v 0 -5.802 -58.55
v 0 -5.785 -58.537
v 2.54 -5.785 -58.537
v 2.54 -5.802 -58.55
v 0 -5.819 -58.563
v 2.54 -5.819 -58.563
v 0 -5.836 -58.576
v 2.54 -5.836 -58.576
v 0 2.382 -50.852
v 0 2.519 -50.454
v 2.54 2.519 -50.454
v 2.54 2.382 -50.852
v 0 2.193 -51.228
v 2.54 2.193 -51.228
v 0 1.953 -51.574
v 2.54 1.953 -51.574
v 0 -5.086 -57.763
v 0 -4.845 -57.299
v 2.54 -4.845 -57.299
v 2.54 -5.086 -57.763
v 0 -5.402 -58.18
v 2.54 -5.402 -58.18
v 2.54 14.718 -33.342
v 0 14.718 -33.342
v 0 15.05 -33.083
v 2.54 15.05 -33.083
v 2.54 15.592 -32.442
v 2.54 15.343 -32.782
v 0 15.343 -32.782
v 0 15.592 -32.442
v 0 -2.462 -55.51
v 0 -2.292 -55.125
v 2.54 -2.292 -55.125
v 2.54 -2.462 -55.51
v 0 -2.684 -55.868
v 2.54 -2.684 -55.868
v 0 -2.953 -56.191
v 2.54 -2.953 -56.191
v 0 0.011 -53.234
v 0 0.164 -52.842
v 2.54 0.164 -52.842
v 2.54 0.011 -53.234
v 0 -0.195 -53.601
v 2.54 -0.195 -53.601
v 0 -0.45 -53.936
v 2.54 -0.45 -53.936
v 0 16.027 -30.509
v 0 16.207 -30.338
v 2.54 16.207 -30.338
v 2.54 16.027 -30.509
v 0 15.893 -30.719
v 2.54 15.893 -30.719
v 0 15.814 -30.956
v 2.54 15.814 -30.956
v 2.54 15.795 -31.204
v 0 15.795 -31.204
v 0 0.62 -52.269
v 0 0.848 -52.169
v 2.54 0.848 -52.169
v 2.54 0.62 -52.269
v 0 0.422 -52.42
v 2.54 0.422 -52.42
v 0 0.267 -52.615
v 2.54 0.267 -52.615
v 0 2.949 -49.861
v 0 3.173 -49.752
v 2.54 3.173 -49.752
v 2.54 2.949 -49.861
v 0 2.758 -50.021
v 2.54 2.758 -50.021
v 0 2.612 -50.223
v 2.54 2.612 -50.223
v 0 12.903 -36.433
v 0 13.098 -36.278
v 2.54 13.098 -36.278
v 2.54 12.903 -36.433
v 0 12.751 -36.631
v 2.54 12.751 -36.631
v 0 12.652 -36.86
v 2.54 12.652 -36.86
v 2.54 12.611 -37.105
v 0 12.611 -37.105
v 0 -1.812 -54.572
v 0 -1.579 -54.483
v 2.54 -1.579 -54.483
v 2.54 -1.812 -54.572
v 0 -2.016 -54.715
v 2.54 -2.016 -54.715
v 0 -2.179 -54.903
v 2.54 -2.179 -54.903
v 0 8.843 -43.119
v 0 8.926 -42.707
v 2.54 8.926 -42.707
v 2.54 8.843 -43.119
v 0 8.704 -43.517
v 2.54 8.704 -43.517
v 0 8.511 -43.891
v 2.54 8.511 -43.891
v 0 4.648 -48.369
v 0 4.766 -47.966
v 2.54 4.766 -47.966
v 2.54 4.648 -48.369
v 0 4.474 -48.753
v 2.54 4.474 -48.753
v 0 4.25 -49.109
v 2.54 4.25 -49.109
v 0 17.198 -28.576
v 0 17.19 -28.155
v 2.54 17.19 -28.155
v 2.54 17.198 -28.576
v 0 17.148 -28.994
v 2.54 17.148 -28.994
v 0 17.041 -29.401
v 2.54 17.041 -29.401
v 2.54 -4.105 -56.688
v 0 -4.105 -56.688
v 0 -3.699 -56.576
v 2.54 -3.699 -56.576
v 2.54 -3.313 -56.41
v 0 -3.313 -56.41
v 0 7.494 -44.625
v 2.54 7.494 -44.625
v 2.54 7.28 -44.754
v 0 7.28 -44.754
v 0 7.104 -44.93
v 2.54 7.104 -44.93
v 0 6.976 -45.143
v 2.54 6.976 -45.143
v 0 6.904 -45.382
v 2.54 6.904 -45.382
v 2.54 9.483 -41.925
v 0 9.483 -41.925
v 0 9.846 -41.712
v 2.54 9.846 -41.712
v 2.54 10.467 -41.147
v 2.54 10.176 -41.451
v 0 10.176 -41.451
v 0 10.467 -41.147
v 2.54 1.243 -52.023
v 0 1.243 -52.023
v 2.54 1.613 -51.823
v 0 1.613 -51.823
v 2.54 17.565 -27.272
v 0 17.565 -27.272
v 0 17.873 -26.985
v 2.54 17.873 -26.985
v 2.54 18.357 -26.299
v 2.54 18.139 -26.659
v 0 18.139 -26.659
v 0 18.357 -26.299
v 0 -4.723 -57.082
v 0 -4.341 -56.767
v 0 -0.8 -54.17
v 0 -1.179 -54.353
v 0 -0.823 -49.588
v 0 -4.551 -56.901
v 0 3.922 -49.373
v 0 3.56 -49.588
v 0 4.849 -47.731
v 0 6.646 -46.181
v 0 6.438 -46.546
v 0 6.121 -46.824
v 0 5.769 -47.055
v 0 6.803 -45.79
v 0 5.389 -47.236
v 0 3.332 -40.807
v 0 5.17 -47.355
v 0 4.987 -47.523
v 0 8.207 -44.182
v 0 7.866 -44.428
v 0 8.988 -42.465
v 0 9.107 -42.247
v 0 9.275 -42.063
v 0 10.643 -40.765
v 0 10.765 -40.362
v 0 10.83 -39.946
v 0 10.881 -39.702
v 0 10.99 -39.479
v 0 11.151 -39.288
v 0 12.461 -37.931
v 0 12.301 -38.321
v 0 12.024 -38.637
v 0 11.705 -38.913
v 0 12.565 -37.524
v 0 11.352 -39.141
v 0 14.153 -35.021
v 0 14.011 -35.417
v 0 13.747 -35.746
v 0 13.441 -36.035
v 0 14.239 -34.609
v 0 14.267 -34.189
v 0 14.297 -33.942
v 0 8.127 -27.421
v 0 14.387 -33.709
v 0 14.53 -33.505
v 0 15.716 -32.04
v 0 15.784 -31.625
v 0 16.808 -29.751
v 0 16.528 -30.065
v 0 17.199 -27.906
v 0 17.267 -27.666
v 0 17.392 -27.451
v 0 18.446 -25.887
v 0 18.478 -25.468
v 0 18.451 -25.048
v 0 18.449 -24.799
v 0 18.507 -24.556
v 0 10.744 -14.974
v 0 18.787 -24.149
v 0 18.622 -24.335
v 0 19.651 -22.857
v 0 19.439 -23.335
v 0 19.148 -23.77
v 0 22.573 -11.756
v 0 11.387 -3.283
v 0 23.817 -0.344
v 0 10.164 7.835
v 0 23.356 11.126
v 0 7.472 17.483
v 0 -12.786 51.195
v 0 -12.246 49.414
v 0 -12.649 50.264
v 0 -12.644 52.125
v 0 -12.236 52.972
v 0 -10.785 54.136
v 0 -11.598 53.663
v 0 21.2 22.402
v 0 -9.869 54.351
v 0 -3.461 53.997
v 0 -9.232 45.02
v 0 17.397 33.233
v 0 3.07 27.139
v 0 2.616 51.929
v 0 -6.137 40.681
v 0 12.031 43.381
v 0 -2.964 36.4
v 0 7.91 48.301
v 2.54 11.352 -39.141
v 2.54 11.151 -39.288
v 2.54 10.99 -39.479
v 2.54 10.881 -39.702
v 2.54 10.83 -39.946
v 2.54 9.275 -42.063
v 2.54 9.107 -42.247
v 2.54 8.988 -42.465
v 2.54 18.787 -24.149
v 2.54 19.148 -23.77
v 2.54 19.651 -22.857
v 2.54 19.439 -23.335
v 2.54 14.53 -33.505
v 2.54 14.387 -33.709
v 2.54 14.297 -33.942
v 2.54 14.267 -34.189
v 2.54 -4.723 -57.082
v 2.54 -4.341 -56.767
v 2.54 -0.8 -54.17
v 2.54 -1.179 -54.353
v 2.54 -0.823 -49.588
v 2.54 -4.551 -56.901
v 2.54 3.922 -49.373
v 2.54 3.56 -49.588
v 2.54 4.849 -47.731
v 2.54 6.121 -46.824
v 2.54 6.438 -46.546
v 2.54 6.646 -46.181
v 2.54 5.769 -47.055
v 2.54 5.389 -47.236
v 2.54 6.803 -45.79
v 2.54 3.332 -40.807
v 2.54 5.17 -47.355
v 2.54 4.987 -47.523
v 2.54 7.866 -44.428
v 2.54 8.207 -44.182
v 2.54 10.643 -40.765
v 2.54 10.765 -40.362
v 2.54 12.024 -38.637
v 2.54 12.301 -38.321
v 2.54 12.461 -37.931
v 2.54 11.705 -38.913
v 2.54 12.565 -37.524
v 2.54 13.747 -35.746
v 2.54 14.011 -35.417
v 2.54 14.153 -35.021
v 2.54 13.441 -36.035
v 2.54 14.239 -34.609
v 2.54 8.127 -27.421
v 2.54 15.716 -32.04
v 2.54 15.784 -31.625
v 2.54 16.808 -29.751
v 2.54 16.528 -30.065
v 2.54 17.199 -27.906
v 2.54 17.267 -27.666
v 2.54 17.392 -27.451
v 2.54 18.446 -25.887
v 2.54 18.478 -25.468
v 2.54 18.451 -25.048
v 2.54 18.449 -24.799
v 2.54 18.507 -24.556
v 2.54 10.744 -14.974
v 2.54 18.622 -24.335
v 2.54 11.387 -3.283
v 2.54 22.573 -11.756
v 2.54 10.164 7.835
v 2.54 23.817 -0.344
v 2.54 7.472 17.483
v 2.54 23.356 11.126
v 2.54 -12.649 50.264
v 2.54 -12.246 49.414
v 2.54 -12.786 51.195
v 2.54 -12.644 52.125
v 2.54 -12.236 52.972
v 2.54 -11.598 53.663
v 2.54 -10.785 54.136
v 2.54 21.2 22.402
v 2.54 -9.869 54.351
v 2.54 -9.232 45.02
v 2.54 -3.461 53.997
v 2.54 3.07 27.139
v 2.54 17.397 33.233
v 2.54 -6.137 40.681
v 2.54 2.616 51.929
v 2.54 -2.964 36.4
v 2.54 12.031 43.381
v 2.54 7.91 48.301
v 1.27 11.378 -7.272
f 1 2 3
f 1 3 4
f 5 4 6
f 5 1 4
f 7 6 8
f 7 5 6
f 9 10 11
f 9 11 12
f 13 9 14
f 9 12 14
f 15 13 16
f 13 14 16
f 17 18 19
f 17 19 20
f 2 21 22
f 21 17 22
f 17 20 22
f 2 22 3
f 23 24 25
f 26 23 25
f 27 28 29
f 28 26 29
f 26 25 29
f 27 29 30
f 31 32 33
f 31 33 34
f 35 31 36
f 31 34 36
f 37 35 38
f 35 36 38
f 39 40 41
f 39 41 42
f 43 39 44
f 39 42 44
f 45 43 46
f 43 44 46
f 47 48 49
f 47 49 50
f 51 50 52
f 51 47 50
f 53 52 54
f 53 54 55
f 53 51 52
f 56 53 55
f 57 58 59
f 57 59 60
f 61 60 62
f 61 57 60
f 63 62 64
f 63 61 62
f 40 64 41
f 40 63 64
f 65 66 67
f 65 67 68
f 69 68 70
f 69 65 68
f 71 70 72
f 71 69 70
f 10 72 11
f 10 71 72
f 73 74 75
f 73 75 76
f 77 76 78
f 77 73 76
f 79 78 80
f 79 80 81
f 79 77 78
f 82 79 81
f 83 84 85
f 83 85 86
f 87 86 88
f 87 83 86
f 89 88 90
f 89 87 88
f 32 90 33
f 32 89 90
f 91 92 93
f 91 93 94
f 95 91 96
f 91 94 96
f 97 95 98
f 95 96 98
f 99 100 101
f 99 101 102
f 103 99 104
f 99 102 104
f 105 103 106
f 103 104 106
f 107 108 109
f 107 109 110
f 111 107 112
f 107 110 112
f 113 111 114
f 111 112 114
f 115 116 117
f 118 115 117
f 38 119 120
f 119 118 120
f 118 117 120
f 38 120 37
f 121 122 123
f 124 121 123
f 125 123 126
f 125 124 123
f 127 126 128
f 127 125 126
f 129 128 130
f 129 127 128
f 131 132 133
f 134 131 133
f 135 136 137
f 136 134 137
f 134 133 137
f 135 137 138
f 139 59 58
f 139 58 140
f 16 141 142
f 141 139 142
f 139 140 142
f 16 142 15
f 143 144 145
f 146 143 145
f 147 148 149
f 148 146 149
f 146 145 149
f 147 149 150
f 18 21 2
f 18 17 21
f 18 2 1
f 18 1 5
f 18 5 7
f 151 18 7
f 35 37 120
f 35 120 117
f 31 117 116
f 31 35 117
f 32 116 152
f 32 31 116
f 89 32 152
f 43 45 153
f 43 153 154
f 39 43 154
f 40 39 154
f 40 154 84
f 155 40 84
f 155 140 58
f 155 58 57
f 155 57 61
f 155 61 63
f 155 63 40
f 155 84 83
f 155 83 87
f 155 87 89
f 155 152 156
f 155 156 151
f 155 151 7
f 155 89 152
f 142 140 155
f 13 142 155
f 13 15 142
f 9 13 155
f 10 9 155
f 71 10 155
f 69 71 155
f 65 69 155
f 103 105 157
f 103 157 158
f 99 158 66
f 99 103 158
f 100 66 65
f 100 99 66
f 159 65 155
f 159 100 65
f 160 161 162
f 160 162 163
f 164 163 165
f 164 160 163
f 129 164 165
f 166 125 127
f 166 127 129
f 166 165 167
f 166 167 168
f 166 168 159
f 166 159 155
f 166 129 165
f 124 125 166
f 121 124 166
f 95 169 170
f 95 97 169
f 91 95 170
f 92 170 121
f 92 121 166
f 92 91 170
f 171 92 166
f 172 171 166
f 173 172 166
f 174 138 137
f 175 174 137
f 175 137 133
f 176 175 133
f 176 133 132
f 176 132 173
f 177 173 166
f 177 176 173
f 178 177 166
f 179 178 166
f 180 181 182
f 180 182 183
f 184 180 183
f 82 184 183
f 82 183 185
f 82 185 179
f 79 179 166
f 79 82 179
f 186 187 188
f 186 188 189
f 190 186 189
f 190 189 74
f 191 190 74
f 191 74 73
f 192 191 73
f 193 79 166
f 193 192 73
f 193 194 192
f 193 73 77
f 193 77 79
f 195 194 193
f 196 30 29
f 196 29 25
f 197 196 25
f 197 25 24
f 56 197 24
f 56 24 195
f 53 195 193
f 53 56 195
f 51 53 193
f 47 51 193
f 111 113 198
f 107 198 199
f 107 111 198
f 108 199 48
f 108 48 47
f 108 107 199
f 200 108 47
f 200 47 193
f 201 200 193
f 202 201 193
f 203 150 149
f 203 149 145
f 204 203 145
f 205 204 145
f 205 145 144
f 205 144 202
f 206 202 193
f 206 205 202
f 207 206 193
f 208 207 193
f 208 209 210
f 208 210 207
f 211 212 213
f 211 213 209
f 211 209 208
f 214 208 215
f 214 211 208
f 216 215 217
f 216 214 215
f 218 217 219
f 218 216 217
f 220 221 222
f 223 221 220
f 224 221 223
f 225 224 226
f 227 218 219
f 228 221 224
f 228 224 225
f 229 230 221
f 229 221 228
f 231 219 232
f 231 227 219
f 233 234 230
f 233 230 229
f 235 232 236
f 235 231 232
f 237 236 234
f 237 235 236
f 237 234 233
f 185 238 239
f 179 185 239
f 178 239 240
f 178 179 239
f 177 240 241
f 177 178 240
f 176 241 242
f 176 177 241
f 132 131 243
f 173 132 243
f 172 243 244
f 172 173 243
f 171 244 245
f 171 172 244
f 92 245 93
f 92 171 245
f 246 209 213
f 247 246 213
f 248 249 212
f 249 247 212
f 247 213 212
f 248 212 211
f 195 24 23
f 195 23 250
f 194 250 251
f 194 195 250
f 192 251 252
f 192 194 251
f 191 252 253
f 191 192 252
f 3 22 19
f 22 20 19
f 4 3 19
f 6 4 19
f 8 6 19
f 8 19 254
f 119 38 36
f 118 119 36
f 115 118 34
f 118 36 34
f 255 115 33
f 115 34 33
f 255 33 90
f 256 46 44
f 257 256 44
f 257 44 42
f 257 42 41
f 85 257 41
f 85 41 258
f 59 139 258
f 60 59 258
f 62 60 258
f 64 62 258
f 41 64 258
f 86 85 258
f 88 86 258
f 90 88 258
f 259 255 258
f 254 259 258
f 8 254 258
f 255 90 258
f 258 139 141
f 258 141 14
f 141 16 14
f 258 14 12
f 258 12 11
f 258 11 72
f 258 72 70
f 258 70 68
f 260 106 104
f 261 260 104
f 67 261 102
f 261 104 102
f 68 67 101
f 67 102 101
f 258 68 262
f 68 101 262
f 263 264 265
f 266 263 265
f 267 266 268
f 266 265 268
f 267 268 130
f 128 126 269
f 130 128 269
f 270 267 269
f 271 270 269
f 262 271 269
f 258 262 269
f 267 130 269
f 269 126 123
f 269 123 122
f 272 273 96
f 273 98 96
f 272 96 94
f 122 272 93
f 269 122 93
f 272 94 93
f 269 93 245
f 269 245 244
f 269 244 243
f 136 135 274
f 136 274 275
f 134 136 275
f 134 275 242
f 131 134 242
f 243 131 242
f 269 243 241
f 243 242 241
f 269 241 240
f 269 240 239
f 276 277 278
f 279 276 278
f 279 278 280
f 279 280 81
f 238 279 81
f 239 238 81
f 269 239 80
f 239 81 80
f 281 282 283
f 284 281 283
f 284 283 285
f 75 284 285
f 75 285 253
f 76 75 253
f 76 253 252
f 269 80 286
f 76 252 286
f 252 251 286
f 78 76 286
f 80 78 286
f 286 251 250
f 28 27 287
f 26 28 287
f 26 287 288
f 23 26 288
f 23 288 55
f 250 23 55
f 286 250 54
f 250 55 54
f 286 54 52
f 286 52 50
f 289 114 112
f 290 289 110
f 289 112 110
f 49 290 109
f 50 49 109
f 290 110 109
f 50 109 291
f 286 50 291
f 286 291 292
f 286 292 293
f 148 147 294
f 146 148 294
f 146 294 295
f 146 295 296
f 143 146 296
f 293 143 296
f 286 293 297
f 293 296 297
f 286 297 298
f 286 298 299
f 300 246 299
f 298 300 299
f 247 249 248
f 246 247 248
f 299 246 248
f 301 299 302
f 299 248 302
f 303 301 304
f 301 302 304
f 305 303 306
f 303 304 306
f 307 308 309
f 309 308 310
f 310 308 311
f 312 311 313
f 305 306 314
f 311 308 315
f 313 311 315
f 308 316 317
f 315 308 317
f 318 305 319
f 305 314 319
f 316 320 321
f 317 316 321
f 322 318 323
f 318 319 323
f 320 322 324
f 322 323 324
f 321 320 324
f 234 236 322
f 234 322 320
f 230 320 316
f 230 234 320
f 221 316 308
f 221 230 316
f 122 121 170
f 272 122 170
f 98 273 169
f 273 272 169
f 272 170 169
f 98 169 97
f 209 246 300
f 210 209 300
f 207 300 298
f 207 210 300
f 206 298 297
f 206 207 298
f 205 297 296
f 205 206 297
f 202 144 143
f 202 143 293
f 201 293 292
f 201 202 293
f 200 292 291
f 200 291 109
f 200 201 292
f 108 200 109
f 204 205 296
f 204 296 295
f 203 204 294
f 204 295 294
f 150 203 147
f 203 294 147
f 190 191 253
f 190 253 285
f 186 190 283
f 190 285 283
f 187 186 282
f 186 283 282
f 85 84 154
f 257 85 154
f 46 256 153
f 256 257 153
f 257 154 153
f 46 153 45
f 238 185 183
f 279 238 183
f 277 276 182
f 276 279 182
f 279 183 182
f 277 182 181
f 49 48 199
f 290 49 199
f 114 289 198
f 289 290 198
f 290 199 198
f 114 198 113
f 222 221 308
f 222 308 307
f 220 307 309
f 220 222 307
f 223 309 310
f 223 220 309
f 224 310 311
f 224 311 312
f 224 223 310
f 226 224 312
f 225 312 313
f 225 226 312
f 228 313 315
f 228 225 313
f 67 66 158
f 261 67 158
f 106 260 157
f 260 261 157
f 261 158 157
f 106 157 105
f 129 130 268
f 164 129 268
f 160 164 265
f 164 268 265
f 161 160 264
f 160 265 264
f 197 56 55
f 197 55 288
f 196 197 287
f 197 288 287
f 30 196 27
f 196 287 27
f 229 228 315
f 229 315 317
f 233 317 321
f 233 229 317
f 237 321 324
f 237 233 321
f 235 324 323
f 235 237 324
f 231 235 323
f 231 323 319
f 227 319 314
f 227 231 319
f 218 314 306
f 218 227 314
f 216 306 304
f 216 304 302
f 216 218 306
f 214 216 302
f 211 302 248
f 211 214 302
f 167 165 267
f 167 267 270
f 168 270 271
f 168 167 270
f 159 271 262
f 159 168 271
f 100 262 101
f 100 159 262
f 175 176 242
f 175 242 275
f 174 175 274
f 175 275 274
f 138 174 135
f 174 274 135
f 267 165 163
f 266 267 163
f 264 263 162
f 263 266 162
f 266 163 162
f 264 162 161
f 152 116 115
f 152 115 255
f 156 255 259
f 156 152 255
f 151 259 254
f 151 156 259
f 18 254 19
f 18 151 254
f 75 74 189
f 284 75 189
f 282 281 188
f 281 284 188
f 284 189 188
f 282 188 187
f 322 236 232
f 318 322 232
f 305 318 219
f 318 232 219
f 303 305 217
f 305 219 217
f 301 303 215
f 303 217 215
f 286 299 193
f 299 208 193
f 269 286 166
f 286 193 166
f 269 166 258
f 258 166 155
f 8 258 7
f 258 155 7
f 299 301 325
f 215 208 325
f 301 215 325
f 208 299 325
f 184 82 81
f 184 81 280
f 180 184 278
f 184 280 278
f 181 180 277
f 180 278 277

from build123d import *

# Parameters (mm, degrees)
BOSS_EXTRUDE1_DEPTH = 2.54
CUT_EXTRUDE1_START  = -2.54
CUT_EXTRUDE1_DEPTH  = 2.54
CIRPATTERN1_COUNT   = 27
CIRPATTERN1_ANGLE   = 65
FILLET1_R           = 3.048


with BuildPart() as part:
    # Sketch1 → Boss-Extrude1 (new body)
    with BuildSketch(Plane(origin=(0, 0, 0), x_dir=(0, 0, -1), z_dir=(1, 0, 0))):
        with BuildLine():
            ThreePointArc((-43.381076299, 12.030901448), (11.033243319, 22.702964816), (58.576421759, -5.83573347))
            add(Edge.make_bspline(
                [(-36.400312003, -2.96377669), (3.456833979, 27.156600716), (58.576421759, -5.83573347)],
                knots=[0, 0, 0, 1, 1, 1], degree=2))
            ThreePointArc((-36.400312003, -2.96377669), (-42.843357456, -7.694652529), (-49.414438561, -12.246016505))
            ThreePointArc((-49.414438561, -12.246016505), (-52.563618606, -12.471871328), (-54.350611077, -9.868987685))
            ThreePointArc((-54.350611077, -9.868987685), (-51.929499525, 2.615525346), (-43.381076299, 12.030901448))
        make_face()
    extrude(amount=BOSS_EXTRUDE1_DEPTH)

    # Sketch2 → Cut-Extrude1 (cut)
    with BuildSketch(Plane(origin=(2.54, 0, 0), x_dir=(0, 0, -1), z_dir=(1, 0, 0)).offset(CUT_EXTRUDE1_START)):
        with BuildLine():
            ThreePointArc((25.551250128, 18.666636018), (25.832723904, 19.021035399), (25.93313959, 19.462332462))
            ThreePointArc((25.93313959, 19.462332462), (24.821637158, 20.47810228), (23.909811979, 19.279853215))
            ThreePointArc((23.909811989, 19.279853244), (24.732270015, 18.977899406), (25.55125014, 18.666636047))
        make_face()
        with BuildLine():
            ThreePointArc((25.55125014, 18.666636047), (24.732270015, 18.977899406), (23.909811989, 19.279853244))
            ThreePointArc((23.909811979, 19.279853215), (24.556324155, 18.506933739), (25.551250128, 18.666636018))
        make_face()
    cut_extrude1 = extrude(amount=CUT_EXTRUDE1_DEPTH, mode=Mode.SUBTRACT)

    # CirPattern1: Cut-Extrude1 ×27 about axis
    cirpattern1_axis = Axis((0, -53.378286458, 2.29893888), (-1, 0, 0))
    for i in range(1, CIRPATTERN1_COUNT):
        add(cut_extrude1.rotate(cirpattern1_axis, i * CIRPATTERN1_ANGLE / (CIRPATTERN1_COUNT - 1)), mode=Mode.SUBTRACT)

    # Fillet1
    # the kernel refuses this fillet: 3.048 mm, written as the material it takes off along each edge
    with BuildSketch(Plane(origin=(5.330131359, -4.91064789, -57.842493504), x_dir=(0, -0.7831380255895678, -0.6218479178027966), z_dir=(-1, 0, 0)), Plane(origin=(5.330131359, 18.666635995, -25.5512501), x_dir=(0, -0.3672934659287651, -0.9301051069024593), z_dir=(-1, 0, 0)), Plane(origin=(5.330131359, 17.383257012, -28.667298272), x_dir=(0, -0.40751449888321617, -0.913198736968006), z_dir=(-1, 0, 0)), Plane(origin=(5.330131359, 15.965179408, -31.724400451), x_dir=(0, -0.4469598048274426, -0.8945540413349069), z_dir=(-1, 0, 0)), Plane(origin=(5.330131359, 14.415102576, -34.71673727), x_dir=(0, -0.48555429737964134, -0.8742065112410012), z_dir=(-1, 0, 0)), Plane(origin=(5.330131359, 12.735977175, -37.638612645), x_dir=(0, -0.5232245097296833, -0.8521948793662941), z_dir=(-1, 0, 0)), Plane(origin=(5.330131359, 10.930999516, -40.484464621), x_dir=(0, -0.5598987344873042, -0.8285610461031312), z_dir=(-1, 0, 0)), Plane(origin=(5.330131359, 9.003605475, -43.248875957), x_dir=(0, -0.5955071601812754, -0.8033499997963732), z_dir=(-1, 0, 0)), Plane(origin=(5.330131359, 6.957463958, -45.926584439), x_dir=(0, -0.6299820041494215, -0.776609731105578), z_dir=(-1, 0, 0)), Plane(origin=(5.330131359, 4.79646991, -48.512492896), x_dir=(0, -0.663257641566846, -0.7483911416520008), z_dir=(-1, 0, 0)), Plane(origin=(5.330131359, 2.524736907, -51.001678904), x_dir=(0, -0.6952707303664444, -0.7187479471245193), z_dir=(-1, 0, 0)), Plane(origin=(5.330131359, 0.146589322, -53.389404158), x_dir=(0, -0.7259603318141797, -0.6877365750287285), z_dir=(-1, 0, 0)), Plane(origin=(5.330131359, -2.333445906, -55.671123485), x_dir=(0, -0.7552680265094119, -0.6554160572739871), z_dir=(-1, 0, 0))) as fillet1_piece_1:
        with BuildLine():
            CenterArc((1.094032194, 3.047920456), FILLET1_R, 240.878460026, 29.535478311)
            ThreePointArc((-0.389319175, 0.385220188), (-0.168317676, 0.2192323), (0, 0))
            ThreePointArc((0, 0), (0.558026272, -0.002015763), (1.116052544, 0))
        make_face()
    extrude(amount=8.120262718, mode=Mode.SUBTRACT)
    with BuildSketch(Plane(origin=(-2.790131315, 19.27985318, -23.909811985), x_dir=(0, -0.8996941201267986, -0.43652089321046916), z_dir=(1, 0, 0)), Plane(origin=(-2.790131315, 18.067489074, -27.0541706), x_dir=(0, -0.917878584614337, -0.39686131570912947), z_dir=(1, 0, 0)), Plane(origin=(-2.790131315, 16.719123874, -30.142653902), x_dir=(0, -0.9343158150472597, -0.35644629013720247), z_dir=(1, 0, 0)), Plane(origin=(-2.790131315, 15.23732427, -33.169382789), x_dir=(0, -0.9489745222231959, -0.3153527487929306), z_dir=(1, 0, 0)), Plane(origin=(-2.790131315, 13.62491095, -36.12859571), x_dir=(0, -0.9618268024599005, -0.27365891556783495), z_dir=(1, 0, 0)), Plane(origin=(-2.790131315, 11.884953236, -39.014659634), x_dir=(0, -0.9728481907114557, -0.23144415704322063), z_dir=(1, 0, 0)), Plane(origin=(-2.790131315, 10.020763236, -41.822080775), x_dir=(0, -0.982017707138919, -0.18878883141123673), z_dir=(1, 0, 0)), Plane(origin=(-2.790131315, 8.035889542, -44.545515048), x_dir=(0, -0.9893178970466047, -0.1457741355086141), z_dir=(1, 0, 0)), Plane(origin=(-2.790131315, 5.934110473, -47.179778241), x_dir=(0, -0.9947348641081103, -0.10248195025378501), z_dir=(1, 0, 0)), Plane(origin=(-2.790131315, 3.719426885, -49.719855883), x_dir=(0, -0.9982582968187538, -0.05899468478194456), z_dir=(1, 0, 0)), Plane(origin=(-2.790131315, -1.031583847, -54.498302279), x_dir=(0, -0.9996013481872734, 0.028233751117859005), z_dir=(1, 0, 0)), Plane(origin=(-2.790131315, -3.558867172, -56.72757499), x_dir=(0, -0.9974184102705359, 0.07180887726038374), z_dir=(1, 0, 0))) as fillet1_piece_2:
        with BuildLine():
            CenterArc((1.366088814, -2.936073381), FILLET1_R, 105.575244384, 29.535478311)
            ThreePointArc((-0.793333618, -0.784980924), (-0.398084606, -0.391057579), (0, 0))
            ThreePointArc((0, 0), (0.273844853, -0.037451811), (0.547689705, 0))
        make_face()
    extrude(amount=8.120262631, mode=Mode.SUBTRACT)
    with BuildSketch(Plane(origin=(-2.790131315, 1.396054555, -52.160912793), x_dir=(0, 0.6999264755180646, 0.7142149038411757), z_dir=(1, 0, 0))) as fillet1_piece_3:
        with BuildLine():
            CenterArc((1.094032194, 3.047920456), FILLET1_R, 240.878460026, 29.535478311)
            ThreePointArc((-0.389319175, 0.385220188), (-0.168317676, 0.2192323), (0, 0))
            ThreePointArc((0, 0), (0.558026272, -0.002015763), (1.116052544, 0))
        make_face()
    extrude(amount=8.120262631, mode=Mode.SUBTRACT)


solid = part.part
